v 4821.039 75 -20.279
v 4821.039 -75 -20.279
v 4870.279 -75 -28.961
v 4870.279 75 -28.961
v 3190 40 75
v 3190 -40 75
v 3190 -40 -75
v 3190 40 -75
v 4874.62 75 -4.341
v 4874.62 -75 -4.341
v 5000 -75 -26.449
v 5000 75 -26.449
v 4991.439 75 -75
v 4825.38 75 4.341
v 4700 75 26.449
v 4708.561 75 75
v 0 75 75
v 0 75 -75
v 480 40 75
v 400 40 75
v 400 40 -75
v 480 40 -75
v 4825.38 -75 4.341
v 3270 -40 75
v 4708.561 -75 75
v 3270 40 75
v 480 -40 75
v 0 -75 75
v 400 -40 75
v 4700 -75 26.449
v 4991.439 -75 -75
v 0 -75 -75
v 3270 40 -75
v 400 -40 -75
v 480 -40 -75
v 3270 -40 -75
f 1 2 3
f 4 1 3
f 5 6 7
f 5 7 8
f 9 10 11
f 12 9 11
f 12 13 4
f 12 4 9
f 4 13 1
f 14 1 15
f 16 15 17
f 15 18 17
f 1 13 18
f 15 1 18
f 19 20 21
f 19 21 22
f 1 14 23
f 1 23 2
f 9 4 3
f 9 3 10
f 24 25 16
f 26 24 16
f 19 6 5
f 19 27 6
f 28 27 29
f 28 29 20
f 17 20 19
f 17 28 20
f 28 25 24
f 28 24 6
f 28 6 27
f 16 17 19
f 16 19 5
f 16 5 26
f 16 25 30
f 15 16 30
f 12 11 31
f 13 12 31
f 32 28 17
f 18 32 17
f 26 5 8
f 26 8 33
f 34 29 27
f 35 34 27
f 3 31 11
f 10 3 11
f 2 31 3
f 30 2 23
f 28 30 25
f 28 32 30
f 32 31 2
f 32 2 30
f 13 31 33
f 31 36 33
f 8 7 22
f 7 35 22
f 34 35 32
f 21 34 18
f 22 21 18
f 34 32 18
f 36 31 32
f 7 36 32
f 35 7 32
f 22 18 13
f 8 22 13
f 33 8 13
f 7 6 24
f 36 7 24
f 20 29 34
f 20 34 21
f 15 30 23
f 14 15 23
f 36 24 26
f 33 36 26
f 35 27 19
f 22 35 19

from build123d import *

# Parameters (mm, degrees)
F0_W     = 150
F0_H     = 150
F1_DEPTH = 5000
F3_DEPTH = 150.001
F4_W     = 80
F4_H     = 80
F5_DEPTH = 150


with BuildPart() as f1:
    # F0 (on Right) → F1 (new body)
    with BuildSketch(Plane.YZ):
        Rectangle(F0_W, F0_H)
    extrude(amount=F1_DEPTH)

    # F2 (on face) → F3 (cut, through all)
    with BuildSketch(Plane.XZ.offset(75)):
        Polygon((5000, -75), (5000, -26.449047), (4991.439157, -75), align=None)
        Polygon((5050, 75), (5000, 75), (5000, -26.449047), (5000, -75), (5050, -75), align=None)
        Polygon((4874.620194, -4.341204), (4825.379806, 4.341204), (4821.038602, -20.278989), (4870.278989, -28.961398), align=None)
        Polygon((5000, 75), (4708.560843, 75), (4700, 26.449047), (4825.379806, 4.341204), (4874.620194, -4.341204), (5000, -26.449047), align=None)
    extrude(amount=-F3_DEPTH, mode=Mode.SUBTRACT)

    # F4 (on face) → F5 (cut, through all)
    with BuildSketch(Plane.XY.offset(75)):
        with Locations((440, 0)):
            Rectangle(F4_W, F4_H)
        with Locations((3230, 0)):
            Rectangle(F4_W, F4_H)
    extrude(amount=-F5_DEPTH, mode=Mode.SUBTRACT)


solid = f1.part
